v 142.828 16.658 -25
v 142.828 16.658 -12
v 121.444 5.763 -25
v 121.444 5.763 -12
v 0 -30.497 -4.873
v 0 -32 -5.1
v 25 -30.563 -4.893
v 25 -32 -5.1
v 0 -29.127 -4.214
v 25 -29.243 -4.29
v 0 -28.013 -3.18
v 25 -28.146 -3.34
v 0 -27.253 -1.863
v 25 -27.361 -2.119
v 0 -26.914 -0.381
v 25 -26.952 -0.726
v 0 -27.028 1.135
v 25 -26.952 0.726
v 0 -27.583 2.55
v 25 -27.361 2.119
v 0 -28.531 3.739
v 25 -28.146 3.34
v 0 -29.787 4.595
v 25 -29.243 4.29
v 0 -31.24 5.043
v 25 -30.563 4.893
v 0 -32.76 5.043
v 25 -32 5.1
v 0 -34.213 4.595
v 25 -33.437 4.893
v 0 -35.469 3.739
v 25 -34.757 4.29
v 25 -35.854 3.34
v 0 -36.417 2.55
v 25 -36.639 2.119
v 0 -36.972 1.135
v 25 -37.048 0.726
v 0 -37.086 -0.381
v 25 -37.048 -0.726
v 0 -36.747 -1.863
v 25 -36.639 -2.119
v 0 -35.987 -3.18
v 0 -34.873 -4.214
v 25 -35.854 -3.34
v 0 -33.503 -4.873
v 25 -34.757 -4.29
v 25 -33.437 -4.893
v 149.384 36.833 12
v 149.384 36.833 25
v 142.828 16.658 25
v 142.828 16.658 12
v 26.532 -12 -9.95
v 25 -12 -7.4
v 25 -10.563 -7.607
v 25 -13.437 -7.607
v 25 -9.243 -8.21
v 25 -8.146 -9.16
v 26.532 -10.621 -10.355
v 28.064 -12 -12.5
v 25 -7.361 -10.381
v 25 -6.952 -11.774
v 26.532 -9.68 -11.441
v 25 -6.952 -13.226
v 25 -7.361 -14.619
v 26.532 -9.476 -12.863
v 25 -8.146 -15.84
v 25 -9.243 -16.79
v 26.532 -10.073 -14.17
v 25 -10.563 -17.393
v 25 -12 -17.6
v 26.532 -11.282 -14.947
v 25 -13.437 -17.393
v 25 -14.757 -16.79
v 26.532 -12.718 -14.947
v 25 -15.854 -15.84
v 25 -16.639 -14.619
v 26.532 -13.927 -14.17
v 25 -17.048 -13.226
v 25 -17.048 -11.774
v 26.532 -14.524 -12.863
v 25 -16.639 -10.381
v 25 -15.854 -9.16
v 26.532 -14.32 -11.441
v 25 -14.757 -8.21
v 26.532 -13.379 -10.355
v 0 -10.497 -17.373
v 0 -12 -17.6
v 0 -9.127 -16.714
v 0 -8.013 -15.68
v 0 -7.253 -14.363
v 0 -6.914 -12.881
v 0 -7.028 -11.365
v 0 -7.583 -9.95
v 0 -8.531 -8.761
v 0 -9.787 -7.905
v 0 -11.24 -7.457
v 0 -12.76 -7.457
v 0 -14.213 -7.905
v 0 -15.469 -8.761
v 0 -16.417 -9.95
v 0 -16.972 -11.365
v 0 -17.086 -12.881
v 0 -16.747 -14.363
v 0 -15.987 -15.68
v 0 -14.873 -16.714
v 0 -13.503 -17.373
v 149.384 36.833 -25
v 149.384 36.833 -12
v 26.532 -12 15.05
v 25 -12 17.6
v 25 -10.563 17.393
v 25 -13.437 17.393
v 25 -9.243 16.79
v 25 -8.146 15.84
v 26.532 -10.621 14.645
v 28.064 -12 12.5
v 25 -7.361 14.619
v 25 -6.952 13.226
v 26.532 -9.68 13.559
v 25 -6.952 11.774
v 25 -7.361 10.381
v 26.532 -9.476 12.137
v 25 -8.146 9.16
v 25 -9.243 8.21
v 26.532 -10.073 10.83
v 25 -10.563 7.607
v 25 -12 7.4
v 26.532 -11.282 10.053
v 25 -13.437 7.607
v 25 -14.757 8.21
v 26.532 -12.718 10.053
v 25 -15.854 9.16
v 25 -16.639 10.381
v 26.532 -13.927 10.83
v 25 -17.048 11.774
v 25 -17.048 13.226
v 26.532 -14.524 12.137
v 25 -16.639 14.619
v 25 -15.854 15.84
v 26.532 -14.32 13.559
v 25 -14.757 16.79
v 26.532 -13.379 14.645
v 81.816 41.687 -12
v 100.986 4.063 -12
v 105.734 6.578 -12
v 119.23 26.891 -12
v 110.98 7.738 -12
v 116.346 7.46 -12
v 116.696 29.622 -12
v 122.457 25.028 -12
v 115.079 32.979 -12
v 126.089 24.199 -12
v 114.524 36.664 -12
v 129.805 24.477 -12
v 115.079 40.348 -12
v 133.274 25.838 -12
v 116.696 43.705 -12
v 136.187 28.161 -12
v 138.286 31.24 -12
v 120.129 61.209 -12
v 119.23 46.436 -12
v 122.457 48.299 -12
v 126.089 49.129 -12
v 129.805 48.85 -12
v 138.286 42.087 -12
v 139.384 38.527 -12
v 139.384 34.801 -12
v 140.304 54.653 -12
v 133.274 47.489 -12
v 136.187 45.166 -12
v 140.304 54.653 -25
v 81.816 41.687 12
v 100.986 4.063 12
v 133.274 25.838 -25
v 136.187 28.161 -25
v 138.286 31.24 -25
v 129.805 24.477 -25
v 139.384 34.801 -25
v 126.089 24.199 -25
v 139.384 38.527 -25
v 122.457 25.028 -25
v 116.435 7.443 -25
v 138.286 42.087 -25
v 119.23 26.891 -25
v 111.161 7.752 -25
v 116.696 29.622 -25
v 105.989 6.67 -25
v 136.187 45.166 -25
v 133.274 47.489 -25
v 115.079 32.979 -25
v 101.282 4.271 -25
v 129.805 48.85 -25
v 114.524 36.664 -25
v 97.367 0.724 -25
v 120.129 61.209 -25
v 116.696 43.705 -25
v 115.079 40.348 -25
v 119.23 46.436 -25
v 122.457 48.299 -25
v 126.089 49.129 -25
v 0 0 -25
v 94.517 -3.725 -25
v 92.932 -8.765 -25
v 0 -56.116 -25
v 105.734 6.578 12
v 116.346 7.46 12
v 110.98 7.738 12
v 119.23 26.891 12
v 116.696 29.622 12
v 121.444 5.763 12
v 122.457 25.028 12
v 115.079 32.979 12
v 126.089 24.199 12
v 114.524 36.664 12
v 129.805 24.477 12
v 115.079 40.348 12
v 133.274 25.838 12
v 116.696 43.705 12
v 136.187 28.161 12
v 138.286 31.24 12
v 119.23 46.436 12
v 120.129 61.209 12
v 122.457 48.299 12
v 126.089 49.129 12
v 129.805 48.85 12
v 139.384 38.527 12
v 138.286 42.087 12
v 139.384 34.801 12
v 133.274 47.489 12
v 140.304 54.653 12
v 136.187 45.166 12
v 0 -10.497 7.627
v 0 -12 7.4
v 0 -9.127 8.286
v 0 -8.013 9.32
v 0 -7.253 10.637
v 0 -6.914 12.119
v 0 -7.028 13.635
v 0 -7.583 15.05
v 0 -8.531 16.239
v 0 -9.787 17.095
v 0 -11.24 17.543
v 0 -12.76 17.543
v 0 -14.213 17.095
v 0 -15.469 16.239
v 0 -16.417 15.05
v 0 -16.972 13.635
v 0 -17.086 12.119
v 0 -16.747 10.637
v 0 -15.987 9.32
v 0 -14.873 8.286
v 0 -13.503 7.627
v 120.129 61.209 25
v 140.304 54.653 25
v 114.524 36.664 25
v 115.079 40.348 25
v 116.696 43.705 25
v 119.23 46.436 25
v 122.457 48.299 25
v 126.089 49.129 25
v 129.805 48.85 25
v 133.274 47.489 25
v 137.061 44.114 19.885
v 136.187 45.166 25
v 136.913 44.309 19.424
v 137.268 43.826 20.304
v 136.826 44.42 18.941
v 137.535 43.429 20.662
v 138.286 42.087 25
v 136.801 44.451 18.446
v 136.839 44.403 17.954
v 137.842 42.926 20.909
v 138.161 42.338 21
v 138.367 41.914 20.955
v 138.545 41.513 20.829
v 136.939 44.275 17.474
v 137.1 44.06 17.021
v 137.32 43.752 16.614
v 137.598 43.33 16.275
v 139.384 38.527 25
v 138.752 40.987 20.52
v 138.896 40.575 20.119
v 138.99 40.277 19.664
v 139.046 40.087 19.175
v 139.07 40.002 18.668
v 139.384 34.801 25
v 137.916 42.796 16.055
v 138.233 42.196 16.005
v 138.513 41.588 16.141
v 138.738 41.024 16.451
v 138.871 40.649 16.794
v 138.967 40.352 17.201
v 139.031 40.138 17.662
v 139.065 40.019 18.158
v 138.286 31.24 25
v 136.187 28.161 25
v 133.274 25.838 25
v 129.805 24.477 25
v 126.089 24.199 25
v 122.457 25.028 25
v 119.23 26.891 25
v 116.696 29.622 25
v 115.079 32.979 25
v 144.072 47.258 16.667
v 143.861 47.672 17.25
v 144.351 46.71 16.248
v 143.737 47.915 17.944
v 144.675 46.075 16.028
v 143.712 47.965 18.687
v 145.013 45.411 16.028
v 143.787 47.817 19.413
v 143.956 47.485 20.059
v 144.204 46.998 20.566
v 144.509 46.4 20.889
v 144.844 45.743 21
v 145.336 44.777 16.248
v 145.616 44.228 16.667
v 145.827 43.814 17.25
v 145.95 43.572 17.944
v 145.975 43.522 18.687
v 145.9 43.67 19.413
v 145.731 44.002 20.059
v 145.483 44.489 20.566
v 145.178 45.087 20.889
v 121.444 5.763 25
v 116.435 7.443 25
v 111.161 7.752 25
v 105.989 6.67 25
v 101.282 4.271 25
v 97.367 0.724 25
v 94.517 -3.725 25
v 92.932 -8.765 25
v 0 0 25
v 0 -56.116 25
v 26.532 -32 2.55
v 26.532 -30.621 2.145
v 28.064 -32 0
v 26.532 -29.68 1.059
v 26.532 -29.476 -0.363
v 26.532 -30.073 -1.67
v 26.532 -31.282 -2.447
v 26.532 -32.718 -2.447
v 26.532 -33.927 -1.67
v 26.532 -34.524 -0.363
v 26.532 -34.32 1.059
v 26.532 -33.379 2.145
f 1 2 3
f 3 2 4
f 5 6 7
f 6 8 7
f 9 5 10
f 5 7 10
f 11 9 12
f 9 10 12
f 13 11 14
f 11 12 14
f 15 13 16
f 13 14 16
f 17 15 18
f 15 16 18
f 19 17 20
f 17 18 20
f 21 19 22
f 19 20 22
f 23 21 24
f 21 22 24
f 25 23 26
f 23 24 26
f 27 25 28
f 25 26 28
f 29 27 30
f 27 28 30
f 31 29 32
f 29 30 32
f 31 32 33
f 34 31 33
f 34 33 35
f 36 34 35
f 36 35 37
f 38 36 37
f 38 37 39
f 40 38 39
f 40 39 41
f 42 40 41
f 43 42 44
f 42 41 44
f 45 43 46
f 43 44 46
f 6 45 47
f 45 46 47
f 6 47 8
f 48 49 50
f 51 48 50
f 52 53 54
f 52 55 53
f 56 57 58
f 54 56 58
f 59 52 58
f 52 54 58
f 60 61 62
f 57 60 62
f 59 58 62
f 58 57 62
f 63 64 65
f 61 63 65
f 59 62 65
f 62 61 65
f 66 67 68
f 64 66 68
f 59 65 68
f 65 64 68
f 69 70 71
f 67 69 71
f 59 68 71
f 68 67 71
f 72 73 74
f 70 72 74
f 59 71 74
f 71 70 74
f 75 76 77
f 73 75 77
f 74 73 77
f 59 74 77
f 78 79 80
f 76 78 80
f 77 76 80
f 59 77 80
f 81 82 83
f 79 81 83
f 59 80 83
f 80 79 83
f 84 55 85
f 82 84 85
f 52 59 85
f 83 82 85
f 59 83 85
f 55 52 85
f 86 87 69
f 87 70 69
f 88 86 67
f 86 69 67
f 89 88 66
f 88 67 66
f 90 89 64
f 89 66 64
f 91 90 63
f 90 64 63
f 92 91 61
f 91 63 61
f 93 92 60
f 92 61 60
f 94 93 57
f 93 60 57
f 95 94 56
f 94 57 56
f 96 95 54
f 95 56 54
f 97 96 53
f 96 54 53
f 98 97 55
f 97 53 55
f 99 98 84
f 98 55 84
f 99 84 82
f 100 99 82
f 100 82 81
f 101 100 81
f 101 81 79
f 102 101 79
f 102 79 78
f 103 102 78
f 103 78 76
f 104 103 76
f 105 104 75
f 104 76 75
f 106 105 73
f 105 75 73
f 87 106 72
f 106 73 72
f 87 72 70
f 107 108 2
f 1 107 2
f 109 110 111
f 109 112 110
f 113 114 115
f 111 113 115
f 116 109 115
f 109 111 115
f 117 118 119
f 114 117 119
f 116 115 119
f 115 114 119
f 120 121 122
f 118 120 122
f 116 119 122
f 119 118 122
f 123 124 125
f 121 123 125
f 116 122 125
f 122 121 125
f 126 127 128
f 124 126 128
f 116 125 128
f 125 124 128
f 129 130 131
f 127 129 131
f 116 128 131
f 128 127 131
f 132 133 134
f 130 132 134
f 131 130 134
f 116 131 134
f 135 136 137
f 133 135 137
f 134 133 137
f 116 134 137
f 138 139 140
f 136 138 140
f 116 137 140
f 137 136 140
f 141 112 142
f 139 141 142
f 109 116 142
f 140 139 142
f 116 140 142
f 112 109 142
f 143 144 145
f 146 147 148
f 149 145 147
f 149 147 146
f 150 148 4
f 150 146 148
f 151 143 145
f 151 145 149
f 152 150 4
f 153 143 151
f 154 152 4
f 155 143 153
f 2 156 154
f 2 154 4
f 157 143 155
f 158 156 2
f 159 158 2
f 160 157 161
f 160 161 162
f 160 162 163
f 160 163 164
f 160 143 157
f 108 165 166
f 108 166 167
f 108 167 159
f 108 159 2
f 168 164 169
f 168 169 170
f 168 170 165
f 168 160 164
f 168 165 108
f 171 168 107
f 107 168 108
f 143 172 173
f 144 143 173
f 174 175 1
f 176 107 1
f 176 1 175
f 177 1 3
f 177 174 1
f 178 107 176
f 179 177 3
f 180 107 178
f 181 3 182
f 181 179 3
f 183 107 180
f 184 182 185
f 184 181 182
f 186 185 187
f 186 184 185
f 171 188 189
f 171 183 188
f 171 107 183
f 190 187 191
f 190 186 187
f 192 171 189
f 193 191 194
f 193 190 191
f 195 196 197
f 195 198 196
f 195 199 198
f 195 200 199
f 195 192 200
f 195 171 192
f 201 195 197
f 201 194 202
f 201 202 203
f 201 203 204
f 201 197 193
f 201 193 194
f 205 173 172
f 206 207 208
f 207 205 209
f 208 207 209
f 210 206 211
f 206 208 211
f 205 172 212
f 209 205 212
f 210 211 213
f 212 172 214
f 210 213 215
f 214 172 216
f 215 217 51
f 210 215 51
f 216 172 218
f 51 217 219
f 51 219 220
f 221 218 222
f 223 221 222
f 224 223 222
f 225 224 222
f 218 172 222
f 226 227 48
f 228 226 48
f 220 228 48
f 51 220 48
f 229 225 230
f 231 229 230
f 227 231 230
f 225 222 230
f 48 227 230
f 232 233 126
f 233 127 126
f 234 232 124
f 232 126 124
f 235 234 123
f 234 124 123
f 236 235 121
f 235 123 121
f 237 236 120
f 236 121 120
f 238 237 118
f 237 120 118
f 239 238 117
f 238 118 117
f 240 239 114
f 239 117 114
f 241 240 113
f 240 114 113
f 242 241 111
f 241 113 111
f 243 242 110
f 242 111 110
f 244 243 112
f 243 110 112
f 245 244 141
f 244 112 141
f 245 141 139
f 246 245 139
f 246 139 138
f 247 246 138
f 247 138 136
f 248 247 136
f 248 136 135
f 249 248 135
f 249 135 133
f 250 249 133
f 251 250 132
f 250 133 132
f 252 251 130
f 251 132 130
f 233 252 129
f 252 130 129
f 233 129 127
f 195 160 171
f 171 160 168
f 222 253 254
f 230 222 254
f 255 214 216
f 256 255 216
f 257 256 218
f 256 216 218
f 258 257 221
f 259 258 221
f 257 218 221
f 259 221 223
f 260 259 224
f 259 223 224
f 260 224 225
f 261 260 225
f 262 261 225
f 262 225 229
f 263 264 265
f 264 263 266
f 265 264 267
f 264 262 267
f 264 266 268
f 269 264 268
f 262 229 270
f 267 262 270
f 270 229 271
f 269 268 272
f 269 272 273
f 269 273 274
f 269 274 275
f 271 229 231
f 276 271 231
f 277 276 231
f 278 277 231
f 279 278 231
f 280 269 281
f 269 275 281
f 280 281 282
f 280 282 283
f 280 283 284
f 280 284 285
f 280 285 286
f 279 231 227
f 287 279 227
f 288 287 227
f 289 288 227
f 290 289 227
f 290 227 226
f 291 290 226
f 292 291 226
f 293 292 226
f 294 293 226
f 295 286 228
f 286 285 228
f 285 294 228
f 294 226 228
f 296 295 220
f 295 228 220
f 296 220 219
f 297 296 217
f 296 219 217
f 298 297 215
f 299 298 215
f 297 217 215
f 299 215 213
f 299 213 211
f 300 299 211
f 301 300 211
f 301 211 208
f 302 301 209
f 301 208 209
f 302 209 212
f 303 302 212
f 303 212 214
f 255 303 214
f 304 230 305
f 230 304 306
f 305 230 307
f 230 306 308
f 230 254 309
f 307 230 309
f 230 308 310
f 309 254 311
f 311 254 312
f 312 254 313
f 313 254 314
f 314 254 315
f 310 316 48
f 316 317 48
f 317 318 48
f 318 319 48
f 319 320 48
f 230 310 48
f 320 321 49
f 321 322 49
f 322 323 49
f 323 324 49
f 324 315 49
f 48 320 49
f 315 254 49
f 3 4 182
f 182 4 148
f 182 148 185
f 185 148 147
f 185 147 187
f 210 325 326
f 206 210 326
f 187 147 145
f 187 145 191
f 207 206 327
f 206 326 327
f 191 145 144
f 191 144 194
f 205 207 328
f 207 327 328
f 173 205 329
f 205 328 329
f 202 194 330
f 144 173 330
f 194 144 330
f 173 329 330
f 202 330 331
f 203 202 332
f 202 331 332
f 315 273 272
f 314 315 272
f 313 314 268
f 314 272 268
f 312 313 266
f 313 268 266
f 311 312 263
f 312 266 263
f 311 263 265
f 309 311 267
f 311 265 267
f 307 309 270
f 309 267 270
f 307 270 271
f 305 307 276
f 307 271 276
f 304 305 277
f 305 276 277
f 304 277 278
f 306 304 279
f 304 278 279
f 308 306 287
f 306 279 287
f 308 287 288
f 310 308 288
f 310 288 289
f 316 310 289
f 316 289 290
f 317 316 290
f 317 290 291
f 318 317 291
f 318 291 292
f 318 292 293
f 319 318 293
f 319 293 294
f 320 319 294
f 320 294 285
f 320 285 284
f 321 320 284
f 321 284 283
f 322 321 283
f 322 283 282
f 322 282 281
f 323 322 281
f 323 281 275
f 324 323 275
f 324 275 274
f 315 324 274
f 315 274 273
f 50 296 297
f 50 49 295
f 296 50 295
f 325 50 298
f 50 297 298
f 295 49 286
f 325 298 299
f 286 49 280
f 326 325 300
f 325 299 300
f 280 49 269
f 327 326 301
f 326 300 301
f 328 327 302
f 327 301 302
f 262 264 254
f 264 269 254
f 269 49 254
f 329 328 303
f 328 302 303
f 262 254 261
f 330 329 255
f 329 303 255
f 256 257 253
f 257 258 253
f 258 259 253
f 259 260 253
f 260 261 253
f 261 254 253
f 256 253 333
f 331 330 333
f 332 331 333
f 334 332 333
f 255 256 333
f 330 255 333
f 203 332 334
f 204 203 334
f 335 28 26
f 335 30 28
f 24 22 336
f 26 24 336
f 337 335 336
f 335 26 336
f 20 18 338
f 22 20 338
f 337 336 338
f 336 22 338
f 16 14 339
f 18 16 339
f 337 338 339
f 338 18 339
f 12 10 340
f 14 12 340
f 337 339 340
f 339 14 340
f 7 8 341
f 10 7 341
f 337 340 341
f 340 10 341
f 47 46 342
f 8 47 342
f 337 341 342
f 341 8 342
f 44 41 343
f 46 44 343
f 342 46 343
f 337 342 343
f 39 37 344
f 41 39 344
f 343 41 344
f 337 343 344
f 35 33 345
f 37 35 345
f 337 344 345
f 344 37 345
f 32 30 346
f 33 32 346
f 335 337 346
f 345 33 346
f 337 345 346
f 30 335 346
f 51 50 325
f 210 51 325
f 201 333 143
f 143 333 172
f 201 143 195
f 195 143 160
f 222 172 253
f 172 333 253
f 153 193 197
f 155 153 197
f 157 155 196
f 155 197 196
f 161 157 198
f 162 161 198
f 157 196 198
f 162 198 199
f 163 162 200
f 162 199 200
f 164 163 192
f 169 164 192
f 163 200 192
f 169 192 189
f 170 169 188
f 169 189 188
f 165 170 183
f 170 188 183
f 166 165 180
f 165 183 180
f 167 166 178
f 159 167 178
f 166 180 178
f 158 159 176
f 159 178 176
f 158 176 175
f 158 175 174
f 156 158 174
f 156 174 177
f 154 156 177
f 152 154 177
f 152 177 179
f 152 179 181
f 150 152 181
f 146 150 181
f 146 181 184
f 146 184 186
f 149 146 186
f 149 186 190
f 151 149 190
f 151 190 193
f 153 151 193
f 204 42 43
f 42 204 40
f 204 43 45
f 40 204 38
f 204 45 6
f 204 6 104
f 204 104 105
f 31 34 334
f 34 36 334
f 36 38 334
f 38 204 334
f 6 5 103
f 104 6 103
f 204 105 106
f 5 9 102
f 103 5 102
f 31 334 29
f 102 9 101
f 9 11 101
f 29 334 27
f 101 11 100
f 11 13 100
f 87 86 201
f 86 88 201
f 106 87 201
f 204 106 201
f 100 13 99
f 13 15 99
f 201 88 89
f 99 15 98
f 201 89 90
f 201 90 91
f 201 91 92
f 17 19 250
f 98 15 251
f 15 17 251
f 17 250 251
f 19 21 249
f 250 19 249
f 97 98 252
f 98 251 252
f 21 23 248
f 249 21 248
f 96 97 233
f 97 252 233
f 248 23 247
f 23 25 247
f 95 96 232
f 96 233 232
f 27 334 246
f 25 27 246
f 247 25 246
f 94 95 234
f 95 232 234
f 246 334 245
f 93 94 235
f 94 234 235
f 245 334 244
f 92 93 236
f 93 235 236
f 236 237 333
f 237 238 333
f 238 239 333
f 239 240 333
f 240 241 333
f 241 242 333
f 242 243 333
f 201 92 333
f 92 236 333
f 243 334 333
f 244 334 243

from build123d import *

# Parameters (mm, degrees)
AUFSATZ_LINEAR_AUSTRAGEN1_DEPTH  = 25
SCHNITT_LINEAR_AUSTRAGEN1_DEPTH  = 12
F_25_0_25_DURCHMESSER_BOHRUNG1_D = 25
M6_GEWINDEBOHRUNG1_D             = 5
M6_GEWINDEBOHRUNG1_DEPTH         = 17
M6_GEWINDEBOHRUNG1_TIP           = 1.502151548
M12_GEWINDEBOHRUNG1_D            = 10.2
M12_GEWINDEBOHRUNG1_DEPTH        = 25
M12_GEWINDEBOHRUNG1_TIP          = 3.064389157


with BuildPart() as part:
    # Skizze1 → Aufsatz-Linear austragen1 (new, symmetric)
    with BuildSketch(Plane.XY):
        with BuildLine():
            Line((0, 0), (120.12882084, 61.208691436))
            Line((120.12882084, 61.208691436), (140.303776199, 54.653451069))
            Line((140.303776199, 54.653451069), (149.383586194, 36.833320585))
            Line((149.383586194, 36.833320585), (142.828345827, 16.658365227))
            Line((142.828345827, 16.658365227), (121.444189247, 5.762593233))
            ThreePointArc((121.444189247, 5.762593233), (103.556160862, 5.62679743), (92.931980473, -8.765102759))
            Line((92.931980473, -8.765102759), (0, -56.116311882))
            Line((0, -56.116311882), (0, 0))
        make_face()
    extrude(amount=AUFSATZ_LINEAR_AUSTRAGEN1_DEPTH, both=True)

    # Skizze2 → Schnitt-Linear austragen1 (cut, symmetric)
    with BuildSketch(Plane.XY):
        Polygon((133.493918703, 68.018548932), (81.8155403, 41.687099947), (104.515065287, -2.863226262), (156.19344369, 23.468222723), align=None)
    extrude(amount=SCHNITT_LINEAR_AUSTRAGEN1_DEPTH, both=True, mode=Mode.SUBTRACT)

    # Ø25.0 (25) Durchmesser Bohrung1 (through all)
    with Locations(Plane.XY.offset(25)):
        with Locations((127.023550713, 36.663575833)):
            Hole(F_25_0_25_DURCHMESSER_BOHRUNG1_D / 2)

    # M6 Gewindebohrung1
    with Locations(Plane(origin=(133.493918703, 68.018548932, 0), x_dir=(0, 0, -1), z_dir=(0.8910065241883688, 0.4539904997395451, 0))):
        with Locations((-18.5, -25)):
            Hole(M6_GEWINDEBOHRUNG1_D / 2, depth=M6_GEWINDEBOHRUNG1_DEPTH)
            with Locations((0, 0, -(M6_GEWINDEBOHRUNG1_DEPTH + M6_GEWINDEBOHRUNG1_TIP / 2))):  # 118° drill point
                Cone(0, M6_GEWINDEBOHRUNG1_D / 2, M6_GEWINDEBOHRUNG1_TIP, mode=Mode.SUBTRACT)

    # M12 Gewindebohrung1
    with Locations(Plane.ZY):
        with Locations((-12.5, -12), (12.5, -12), (0, -32)):
            Hole(M12_GEWINDEBOHRUNG1_D / 2, depth=M12_GEWINDEBOHRUNG1_DEPTH)
            with Locations((0, 0, -(M12_GEWINDEBOHRUNG1_DEPTH + M12_GEWINDEBOHRUNG1_TIP / 2))):  # 118° drill point
                Cone(0, M12_GEWINDEBOHRUNG1_D / 2, M12_GEWINDEBOHRUNG1_TIP, mode=Mode.SUBTRACT)


solid = part.part
